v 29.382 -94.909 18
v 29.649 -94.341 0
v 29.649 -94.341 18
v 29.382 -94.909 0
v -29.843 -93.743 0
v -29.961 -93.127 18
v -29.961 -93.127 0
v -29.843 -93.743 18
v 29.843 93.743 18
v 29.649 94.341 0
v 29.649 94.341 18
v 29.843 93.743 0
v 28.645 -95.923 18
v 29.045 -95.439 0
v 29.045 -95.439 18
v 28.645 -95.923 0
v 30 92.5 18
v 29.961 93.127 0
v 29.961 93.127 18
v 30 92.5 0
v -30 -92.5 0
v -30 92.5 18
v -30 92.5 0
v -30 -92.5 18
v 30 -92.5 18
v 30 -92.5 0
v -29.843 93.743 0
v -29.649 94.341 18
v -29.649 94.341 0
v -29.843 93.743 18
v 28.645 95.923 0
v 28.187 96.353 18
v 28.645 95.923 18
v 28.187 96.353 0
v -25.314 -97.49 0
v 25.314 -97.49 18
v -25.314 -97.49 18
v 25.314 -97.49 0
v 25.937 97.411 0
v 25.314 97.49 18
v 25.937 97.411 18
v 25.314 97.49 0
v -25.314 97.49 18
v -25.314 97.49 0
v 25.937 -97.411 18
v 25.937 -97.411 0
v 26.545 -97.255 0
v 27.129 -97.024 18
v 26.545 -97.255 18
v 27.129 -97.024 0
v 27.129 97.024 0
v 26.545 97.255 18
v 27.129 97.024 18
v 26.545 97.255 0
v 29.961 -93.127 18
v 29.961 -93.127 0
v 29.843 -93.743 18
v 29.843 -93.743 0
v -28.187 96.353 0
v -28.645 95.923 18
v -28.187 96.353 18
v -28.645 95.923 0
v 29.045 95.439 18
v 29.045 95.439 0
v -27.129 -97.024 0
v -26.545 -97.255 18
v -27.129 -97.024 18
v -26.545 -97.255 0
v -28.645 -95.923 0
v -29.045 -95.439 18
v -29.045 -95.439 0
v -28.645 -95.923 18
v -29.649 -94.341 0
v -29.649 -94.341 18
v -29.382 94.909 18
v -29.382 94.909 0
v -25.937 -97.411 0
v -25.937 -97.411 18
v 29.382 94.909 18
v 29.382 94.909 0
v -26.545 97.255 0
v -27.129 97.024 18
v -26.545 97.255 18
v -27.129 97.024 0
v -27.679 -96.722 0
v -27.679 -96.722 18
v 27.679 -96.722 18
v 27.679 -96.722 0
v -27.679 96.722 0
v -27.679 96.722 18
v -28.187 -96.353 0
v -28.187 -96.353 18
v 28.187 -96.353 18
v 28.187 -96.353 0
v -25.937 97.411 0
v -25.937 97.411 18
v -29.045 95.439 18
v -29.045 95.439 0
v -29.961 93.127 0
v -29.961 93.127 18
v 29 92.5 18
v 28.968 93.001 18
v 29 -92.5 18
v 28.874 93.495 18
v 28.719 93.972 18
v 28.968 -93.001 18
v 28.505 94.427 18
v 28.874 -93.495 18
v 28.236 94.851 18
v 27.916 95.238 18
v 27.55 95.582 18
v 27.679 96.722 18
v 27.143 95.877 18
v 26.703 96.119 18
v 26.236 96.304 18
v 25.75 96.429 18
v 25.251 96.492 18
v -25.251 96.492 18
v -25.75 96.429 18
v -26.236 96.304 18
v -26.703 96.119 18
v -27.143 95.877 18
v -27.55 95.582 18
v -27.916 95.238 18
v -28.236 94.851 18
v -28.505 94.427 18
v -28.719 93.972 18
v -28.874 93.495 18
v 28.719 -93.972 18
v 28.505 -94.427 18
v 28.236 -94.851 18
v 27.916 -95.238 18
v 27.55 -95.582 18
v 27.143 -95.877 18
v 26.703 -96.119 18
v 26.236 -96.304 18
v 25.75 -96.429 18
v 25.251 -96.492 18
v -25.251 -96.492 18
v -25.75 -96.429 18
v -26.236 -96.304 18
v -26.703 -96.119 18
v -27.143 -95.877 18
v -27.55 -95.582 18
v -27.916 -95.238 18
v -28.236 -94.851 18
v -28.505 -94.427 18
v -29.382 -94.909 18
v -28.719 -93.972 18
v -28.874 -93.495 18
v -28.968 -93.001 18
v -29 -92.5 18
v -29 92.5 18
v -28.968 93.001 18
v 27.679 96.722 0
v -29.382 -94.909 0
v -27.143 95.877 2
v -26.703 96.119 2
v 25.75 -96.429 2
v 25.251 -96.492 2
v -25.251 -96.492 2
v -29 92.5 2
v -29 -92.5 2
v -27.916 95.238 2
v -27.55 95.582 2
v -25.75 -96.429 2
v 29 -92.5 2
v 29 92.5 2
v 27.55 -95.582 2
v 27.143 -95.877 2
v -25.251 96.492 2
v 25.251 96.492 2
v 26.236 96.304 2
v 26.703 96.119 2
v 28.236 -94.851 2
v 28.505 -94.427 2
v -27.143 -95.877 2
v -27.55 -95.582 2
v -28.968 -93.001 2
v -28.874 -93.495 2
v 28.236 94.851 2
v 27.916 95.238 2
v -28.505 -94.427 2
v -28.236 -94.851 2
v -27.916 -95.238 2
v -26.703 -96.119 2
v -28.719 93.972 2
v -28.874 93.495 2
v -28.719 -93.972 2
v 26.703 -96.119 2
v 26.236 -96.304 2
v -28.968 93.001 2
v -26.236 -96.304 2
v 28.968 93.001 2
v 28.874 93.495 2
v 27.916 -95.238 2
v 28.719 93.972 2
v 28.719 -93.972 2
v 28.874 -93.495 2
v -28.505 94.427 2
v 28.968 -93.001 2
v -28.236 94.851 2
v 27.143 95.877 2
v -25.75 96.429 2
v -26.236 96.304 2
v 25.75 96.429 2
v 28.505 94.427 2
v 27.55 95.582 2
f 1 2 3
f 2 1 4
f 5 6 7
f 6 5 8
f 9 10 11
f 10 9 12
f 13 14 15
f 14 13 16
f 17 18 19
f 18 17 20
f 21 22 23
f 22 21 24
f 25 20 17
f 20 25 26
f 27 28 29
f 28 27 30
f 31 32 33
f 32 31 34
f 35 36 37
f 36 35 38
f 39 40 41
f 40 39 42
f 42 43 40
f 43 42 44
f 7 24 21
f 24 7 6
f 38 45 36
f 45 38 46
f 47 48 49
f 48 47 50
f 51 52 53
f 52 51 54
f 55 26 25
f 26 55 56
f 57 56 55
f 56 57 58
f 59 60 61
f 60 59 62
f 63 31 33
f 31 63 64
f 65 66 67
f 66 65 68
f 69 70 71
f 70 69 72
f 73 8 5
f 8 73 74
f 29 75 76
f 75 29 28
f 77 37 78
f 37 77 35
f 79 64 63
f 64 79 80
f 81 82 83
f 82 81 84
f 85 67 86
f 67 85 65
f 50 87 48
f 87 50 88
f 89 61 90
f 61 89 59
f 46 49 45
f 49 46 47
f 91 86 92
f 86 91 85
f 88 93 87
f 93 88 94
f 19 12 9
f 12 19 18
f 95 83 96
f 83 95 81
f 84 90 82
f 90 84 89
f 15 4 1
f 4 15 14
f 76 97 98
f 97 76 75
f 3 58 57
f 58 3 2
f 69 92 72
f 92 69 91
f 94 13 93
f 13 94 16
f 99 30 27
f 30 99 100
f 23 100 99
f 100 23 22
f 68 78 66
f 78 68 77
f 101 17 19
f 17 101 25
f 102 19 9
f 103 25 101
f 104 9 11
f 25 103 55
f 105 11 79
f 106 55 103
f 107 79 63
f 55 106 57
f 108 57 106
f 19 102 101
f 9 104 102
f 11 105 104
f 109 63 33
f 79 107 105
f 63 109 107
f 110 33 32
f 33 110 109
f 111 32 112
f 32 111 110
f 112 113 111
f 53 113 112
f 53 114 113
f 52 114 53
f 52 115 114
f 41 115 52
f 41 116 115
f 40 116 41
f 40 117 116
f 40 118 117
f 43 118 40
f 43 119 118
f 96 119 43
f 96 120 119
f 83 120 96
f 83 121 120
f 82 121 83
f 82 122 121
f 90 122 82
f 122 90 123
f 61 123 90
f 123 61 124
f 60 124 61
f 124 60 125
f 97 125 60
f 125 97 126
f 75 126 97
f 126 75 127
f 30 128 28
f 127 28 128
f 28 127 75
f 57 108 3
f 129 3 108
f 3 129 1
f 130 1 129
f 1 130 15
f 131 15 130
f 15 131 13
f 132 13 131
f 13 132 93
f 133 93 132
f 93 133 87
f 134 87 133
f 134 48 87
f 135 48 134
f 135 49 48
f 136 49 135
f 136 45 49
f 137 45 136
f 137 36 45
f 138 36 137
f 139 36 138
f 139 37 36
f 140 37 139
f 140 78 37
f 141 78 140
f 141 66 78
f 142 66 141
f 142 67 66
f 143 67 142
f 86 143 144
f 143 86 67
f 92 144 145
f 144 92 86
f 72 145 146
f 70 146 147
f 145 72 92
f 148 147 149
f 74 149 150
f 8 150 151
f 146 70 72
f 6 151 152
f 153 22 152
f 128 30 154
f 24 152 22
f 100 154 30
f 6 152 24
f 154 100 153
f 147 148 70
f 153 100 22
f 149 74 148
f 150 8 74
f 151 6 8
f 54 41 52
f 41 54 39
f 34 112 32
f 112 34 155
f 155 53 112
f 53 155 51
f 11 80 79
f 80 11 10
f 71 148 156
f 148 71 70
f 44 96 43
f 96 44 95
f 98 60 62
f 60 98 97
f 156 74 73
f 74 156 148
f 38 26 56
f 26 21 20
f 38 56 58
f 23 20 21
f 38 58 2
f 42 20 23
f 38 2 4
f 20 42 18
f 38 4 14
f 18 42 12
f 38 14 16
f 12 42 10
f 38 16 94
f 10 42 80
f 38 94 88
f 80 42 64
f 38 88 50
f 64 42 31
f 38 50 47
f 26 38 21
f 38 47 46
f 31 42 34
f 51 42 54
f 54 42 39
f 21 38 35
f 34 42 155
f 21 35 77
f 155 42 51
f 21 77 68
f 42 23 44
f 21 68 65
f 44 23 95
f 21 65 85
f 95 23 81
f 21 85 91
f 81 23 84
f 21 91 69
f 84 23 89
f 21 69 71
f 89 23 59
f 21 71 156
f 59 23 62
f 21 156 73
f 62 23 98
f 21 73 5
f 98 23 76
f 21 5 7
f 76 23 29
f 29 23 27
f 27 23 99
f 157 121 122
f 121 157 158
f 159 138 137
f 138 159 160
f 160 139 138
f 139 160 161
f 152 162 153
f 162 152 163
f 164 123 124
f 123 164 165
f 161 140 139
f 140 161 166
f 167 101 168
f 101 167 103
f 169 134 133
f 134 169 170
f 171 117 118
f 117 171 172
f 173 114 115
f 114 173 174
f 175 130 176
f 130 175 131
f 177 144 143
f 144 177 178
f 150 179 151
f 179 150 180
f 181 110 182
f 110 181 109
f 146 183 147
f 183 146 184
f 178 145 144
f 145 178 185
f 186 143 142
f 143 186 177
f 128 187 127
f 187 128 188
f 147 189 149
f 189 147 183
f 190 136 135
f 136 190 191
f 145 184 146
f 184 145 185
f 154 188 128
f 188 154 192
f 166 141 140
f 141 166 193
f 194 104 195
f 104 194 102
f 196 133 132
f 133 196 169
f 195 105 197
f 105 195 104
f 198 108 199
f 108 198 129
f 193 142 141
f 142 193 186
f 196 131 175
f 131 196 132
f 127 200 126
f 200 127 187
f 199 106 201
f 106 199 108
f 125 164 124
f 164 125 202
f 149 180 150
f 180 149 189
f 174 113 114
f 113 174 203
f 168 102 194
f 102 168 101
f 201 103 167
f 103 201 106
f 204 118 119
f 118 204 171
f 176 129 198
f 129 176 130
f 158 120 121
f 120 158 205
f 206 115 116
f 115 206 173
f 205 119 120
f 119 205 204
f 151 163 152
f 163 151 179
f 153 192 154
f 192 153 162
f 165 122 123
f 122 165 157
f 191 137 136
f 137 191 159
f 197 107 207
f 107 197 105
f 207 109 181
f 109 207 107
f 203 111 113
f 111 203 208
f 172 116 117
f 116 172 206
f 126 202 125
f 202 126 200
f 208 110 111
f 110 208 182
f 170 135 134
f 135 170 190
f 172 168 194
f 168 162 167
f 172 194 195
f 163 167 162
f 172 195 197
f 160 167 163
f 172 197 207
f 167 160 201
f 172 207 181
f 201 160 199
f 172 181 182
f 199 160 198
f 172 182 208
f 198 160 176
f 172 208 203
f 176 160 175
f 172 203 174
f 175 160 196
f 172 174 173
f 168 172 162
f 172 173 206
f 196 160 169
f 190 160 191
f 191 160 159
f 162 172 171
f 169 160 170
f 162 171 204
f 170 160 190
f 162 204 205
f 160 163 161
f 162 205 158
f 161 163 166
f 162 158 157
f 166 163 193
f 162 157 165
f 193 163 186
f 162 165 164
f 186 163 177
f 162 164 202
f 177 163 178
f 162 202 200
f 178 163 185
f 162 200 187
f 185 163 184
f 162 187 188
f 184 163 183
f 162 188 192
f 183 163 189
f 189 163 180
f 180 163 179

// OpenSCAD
$fn = 50;


difference() {
	union() {
		hull() {
			translate(v = [-25.0000000000, 92.5000000000, 0]) {
				cylinder(h = 18, r = 5);
			}
			translate(v = [25.0000000000, 92.5000000000, 0]) {
				cylinder(h = 18, r = 5);
			}
			translate(v = [-25.0000000000, -92.5000000000, 0]) {
				cylinder(h = 18, r = 5);
			}
			translate(v = [25.0000000000, -92.5000000000, 0]) {
				cylinder(h = 18, r = 5);
			}
		}
	}
	union() {
		translate(v = [0, 0, 2]) {
			hull() {
				translate(v = [-25.0000000000, 92.5000000000, 0]) {
					cylinder(h = 16, r = 4);
				}
				translate(v = [25.0000000000, 92.5000000000, 0]) {
					cylinder(h = 16, r = 4);
				}
				translate(v = [-25.0000000000, -92.5000000000, 0]) {
					cylinder(h = 16, r = 4);
				}
				translate(v = [25.0000000000, -92.5000000000, 0]) {
					cylinder(h = 16, r = 4);
				}
			}
		}
	}
}
